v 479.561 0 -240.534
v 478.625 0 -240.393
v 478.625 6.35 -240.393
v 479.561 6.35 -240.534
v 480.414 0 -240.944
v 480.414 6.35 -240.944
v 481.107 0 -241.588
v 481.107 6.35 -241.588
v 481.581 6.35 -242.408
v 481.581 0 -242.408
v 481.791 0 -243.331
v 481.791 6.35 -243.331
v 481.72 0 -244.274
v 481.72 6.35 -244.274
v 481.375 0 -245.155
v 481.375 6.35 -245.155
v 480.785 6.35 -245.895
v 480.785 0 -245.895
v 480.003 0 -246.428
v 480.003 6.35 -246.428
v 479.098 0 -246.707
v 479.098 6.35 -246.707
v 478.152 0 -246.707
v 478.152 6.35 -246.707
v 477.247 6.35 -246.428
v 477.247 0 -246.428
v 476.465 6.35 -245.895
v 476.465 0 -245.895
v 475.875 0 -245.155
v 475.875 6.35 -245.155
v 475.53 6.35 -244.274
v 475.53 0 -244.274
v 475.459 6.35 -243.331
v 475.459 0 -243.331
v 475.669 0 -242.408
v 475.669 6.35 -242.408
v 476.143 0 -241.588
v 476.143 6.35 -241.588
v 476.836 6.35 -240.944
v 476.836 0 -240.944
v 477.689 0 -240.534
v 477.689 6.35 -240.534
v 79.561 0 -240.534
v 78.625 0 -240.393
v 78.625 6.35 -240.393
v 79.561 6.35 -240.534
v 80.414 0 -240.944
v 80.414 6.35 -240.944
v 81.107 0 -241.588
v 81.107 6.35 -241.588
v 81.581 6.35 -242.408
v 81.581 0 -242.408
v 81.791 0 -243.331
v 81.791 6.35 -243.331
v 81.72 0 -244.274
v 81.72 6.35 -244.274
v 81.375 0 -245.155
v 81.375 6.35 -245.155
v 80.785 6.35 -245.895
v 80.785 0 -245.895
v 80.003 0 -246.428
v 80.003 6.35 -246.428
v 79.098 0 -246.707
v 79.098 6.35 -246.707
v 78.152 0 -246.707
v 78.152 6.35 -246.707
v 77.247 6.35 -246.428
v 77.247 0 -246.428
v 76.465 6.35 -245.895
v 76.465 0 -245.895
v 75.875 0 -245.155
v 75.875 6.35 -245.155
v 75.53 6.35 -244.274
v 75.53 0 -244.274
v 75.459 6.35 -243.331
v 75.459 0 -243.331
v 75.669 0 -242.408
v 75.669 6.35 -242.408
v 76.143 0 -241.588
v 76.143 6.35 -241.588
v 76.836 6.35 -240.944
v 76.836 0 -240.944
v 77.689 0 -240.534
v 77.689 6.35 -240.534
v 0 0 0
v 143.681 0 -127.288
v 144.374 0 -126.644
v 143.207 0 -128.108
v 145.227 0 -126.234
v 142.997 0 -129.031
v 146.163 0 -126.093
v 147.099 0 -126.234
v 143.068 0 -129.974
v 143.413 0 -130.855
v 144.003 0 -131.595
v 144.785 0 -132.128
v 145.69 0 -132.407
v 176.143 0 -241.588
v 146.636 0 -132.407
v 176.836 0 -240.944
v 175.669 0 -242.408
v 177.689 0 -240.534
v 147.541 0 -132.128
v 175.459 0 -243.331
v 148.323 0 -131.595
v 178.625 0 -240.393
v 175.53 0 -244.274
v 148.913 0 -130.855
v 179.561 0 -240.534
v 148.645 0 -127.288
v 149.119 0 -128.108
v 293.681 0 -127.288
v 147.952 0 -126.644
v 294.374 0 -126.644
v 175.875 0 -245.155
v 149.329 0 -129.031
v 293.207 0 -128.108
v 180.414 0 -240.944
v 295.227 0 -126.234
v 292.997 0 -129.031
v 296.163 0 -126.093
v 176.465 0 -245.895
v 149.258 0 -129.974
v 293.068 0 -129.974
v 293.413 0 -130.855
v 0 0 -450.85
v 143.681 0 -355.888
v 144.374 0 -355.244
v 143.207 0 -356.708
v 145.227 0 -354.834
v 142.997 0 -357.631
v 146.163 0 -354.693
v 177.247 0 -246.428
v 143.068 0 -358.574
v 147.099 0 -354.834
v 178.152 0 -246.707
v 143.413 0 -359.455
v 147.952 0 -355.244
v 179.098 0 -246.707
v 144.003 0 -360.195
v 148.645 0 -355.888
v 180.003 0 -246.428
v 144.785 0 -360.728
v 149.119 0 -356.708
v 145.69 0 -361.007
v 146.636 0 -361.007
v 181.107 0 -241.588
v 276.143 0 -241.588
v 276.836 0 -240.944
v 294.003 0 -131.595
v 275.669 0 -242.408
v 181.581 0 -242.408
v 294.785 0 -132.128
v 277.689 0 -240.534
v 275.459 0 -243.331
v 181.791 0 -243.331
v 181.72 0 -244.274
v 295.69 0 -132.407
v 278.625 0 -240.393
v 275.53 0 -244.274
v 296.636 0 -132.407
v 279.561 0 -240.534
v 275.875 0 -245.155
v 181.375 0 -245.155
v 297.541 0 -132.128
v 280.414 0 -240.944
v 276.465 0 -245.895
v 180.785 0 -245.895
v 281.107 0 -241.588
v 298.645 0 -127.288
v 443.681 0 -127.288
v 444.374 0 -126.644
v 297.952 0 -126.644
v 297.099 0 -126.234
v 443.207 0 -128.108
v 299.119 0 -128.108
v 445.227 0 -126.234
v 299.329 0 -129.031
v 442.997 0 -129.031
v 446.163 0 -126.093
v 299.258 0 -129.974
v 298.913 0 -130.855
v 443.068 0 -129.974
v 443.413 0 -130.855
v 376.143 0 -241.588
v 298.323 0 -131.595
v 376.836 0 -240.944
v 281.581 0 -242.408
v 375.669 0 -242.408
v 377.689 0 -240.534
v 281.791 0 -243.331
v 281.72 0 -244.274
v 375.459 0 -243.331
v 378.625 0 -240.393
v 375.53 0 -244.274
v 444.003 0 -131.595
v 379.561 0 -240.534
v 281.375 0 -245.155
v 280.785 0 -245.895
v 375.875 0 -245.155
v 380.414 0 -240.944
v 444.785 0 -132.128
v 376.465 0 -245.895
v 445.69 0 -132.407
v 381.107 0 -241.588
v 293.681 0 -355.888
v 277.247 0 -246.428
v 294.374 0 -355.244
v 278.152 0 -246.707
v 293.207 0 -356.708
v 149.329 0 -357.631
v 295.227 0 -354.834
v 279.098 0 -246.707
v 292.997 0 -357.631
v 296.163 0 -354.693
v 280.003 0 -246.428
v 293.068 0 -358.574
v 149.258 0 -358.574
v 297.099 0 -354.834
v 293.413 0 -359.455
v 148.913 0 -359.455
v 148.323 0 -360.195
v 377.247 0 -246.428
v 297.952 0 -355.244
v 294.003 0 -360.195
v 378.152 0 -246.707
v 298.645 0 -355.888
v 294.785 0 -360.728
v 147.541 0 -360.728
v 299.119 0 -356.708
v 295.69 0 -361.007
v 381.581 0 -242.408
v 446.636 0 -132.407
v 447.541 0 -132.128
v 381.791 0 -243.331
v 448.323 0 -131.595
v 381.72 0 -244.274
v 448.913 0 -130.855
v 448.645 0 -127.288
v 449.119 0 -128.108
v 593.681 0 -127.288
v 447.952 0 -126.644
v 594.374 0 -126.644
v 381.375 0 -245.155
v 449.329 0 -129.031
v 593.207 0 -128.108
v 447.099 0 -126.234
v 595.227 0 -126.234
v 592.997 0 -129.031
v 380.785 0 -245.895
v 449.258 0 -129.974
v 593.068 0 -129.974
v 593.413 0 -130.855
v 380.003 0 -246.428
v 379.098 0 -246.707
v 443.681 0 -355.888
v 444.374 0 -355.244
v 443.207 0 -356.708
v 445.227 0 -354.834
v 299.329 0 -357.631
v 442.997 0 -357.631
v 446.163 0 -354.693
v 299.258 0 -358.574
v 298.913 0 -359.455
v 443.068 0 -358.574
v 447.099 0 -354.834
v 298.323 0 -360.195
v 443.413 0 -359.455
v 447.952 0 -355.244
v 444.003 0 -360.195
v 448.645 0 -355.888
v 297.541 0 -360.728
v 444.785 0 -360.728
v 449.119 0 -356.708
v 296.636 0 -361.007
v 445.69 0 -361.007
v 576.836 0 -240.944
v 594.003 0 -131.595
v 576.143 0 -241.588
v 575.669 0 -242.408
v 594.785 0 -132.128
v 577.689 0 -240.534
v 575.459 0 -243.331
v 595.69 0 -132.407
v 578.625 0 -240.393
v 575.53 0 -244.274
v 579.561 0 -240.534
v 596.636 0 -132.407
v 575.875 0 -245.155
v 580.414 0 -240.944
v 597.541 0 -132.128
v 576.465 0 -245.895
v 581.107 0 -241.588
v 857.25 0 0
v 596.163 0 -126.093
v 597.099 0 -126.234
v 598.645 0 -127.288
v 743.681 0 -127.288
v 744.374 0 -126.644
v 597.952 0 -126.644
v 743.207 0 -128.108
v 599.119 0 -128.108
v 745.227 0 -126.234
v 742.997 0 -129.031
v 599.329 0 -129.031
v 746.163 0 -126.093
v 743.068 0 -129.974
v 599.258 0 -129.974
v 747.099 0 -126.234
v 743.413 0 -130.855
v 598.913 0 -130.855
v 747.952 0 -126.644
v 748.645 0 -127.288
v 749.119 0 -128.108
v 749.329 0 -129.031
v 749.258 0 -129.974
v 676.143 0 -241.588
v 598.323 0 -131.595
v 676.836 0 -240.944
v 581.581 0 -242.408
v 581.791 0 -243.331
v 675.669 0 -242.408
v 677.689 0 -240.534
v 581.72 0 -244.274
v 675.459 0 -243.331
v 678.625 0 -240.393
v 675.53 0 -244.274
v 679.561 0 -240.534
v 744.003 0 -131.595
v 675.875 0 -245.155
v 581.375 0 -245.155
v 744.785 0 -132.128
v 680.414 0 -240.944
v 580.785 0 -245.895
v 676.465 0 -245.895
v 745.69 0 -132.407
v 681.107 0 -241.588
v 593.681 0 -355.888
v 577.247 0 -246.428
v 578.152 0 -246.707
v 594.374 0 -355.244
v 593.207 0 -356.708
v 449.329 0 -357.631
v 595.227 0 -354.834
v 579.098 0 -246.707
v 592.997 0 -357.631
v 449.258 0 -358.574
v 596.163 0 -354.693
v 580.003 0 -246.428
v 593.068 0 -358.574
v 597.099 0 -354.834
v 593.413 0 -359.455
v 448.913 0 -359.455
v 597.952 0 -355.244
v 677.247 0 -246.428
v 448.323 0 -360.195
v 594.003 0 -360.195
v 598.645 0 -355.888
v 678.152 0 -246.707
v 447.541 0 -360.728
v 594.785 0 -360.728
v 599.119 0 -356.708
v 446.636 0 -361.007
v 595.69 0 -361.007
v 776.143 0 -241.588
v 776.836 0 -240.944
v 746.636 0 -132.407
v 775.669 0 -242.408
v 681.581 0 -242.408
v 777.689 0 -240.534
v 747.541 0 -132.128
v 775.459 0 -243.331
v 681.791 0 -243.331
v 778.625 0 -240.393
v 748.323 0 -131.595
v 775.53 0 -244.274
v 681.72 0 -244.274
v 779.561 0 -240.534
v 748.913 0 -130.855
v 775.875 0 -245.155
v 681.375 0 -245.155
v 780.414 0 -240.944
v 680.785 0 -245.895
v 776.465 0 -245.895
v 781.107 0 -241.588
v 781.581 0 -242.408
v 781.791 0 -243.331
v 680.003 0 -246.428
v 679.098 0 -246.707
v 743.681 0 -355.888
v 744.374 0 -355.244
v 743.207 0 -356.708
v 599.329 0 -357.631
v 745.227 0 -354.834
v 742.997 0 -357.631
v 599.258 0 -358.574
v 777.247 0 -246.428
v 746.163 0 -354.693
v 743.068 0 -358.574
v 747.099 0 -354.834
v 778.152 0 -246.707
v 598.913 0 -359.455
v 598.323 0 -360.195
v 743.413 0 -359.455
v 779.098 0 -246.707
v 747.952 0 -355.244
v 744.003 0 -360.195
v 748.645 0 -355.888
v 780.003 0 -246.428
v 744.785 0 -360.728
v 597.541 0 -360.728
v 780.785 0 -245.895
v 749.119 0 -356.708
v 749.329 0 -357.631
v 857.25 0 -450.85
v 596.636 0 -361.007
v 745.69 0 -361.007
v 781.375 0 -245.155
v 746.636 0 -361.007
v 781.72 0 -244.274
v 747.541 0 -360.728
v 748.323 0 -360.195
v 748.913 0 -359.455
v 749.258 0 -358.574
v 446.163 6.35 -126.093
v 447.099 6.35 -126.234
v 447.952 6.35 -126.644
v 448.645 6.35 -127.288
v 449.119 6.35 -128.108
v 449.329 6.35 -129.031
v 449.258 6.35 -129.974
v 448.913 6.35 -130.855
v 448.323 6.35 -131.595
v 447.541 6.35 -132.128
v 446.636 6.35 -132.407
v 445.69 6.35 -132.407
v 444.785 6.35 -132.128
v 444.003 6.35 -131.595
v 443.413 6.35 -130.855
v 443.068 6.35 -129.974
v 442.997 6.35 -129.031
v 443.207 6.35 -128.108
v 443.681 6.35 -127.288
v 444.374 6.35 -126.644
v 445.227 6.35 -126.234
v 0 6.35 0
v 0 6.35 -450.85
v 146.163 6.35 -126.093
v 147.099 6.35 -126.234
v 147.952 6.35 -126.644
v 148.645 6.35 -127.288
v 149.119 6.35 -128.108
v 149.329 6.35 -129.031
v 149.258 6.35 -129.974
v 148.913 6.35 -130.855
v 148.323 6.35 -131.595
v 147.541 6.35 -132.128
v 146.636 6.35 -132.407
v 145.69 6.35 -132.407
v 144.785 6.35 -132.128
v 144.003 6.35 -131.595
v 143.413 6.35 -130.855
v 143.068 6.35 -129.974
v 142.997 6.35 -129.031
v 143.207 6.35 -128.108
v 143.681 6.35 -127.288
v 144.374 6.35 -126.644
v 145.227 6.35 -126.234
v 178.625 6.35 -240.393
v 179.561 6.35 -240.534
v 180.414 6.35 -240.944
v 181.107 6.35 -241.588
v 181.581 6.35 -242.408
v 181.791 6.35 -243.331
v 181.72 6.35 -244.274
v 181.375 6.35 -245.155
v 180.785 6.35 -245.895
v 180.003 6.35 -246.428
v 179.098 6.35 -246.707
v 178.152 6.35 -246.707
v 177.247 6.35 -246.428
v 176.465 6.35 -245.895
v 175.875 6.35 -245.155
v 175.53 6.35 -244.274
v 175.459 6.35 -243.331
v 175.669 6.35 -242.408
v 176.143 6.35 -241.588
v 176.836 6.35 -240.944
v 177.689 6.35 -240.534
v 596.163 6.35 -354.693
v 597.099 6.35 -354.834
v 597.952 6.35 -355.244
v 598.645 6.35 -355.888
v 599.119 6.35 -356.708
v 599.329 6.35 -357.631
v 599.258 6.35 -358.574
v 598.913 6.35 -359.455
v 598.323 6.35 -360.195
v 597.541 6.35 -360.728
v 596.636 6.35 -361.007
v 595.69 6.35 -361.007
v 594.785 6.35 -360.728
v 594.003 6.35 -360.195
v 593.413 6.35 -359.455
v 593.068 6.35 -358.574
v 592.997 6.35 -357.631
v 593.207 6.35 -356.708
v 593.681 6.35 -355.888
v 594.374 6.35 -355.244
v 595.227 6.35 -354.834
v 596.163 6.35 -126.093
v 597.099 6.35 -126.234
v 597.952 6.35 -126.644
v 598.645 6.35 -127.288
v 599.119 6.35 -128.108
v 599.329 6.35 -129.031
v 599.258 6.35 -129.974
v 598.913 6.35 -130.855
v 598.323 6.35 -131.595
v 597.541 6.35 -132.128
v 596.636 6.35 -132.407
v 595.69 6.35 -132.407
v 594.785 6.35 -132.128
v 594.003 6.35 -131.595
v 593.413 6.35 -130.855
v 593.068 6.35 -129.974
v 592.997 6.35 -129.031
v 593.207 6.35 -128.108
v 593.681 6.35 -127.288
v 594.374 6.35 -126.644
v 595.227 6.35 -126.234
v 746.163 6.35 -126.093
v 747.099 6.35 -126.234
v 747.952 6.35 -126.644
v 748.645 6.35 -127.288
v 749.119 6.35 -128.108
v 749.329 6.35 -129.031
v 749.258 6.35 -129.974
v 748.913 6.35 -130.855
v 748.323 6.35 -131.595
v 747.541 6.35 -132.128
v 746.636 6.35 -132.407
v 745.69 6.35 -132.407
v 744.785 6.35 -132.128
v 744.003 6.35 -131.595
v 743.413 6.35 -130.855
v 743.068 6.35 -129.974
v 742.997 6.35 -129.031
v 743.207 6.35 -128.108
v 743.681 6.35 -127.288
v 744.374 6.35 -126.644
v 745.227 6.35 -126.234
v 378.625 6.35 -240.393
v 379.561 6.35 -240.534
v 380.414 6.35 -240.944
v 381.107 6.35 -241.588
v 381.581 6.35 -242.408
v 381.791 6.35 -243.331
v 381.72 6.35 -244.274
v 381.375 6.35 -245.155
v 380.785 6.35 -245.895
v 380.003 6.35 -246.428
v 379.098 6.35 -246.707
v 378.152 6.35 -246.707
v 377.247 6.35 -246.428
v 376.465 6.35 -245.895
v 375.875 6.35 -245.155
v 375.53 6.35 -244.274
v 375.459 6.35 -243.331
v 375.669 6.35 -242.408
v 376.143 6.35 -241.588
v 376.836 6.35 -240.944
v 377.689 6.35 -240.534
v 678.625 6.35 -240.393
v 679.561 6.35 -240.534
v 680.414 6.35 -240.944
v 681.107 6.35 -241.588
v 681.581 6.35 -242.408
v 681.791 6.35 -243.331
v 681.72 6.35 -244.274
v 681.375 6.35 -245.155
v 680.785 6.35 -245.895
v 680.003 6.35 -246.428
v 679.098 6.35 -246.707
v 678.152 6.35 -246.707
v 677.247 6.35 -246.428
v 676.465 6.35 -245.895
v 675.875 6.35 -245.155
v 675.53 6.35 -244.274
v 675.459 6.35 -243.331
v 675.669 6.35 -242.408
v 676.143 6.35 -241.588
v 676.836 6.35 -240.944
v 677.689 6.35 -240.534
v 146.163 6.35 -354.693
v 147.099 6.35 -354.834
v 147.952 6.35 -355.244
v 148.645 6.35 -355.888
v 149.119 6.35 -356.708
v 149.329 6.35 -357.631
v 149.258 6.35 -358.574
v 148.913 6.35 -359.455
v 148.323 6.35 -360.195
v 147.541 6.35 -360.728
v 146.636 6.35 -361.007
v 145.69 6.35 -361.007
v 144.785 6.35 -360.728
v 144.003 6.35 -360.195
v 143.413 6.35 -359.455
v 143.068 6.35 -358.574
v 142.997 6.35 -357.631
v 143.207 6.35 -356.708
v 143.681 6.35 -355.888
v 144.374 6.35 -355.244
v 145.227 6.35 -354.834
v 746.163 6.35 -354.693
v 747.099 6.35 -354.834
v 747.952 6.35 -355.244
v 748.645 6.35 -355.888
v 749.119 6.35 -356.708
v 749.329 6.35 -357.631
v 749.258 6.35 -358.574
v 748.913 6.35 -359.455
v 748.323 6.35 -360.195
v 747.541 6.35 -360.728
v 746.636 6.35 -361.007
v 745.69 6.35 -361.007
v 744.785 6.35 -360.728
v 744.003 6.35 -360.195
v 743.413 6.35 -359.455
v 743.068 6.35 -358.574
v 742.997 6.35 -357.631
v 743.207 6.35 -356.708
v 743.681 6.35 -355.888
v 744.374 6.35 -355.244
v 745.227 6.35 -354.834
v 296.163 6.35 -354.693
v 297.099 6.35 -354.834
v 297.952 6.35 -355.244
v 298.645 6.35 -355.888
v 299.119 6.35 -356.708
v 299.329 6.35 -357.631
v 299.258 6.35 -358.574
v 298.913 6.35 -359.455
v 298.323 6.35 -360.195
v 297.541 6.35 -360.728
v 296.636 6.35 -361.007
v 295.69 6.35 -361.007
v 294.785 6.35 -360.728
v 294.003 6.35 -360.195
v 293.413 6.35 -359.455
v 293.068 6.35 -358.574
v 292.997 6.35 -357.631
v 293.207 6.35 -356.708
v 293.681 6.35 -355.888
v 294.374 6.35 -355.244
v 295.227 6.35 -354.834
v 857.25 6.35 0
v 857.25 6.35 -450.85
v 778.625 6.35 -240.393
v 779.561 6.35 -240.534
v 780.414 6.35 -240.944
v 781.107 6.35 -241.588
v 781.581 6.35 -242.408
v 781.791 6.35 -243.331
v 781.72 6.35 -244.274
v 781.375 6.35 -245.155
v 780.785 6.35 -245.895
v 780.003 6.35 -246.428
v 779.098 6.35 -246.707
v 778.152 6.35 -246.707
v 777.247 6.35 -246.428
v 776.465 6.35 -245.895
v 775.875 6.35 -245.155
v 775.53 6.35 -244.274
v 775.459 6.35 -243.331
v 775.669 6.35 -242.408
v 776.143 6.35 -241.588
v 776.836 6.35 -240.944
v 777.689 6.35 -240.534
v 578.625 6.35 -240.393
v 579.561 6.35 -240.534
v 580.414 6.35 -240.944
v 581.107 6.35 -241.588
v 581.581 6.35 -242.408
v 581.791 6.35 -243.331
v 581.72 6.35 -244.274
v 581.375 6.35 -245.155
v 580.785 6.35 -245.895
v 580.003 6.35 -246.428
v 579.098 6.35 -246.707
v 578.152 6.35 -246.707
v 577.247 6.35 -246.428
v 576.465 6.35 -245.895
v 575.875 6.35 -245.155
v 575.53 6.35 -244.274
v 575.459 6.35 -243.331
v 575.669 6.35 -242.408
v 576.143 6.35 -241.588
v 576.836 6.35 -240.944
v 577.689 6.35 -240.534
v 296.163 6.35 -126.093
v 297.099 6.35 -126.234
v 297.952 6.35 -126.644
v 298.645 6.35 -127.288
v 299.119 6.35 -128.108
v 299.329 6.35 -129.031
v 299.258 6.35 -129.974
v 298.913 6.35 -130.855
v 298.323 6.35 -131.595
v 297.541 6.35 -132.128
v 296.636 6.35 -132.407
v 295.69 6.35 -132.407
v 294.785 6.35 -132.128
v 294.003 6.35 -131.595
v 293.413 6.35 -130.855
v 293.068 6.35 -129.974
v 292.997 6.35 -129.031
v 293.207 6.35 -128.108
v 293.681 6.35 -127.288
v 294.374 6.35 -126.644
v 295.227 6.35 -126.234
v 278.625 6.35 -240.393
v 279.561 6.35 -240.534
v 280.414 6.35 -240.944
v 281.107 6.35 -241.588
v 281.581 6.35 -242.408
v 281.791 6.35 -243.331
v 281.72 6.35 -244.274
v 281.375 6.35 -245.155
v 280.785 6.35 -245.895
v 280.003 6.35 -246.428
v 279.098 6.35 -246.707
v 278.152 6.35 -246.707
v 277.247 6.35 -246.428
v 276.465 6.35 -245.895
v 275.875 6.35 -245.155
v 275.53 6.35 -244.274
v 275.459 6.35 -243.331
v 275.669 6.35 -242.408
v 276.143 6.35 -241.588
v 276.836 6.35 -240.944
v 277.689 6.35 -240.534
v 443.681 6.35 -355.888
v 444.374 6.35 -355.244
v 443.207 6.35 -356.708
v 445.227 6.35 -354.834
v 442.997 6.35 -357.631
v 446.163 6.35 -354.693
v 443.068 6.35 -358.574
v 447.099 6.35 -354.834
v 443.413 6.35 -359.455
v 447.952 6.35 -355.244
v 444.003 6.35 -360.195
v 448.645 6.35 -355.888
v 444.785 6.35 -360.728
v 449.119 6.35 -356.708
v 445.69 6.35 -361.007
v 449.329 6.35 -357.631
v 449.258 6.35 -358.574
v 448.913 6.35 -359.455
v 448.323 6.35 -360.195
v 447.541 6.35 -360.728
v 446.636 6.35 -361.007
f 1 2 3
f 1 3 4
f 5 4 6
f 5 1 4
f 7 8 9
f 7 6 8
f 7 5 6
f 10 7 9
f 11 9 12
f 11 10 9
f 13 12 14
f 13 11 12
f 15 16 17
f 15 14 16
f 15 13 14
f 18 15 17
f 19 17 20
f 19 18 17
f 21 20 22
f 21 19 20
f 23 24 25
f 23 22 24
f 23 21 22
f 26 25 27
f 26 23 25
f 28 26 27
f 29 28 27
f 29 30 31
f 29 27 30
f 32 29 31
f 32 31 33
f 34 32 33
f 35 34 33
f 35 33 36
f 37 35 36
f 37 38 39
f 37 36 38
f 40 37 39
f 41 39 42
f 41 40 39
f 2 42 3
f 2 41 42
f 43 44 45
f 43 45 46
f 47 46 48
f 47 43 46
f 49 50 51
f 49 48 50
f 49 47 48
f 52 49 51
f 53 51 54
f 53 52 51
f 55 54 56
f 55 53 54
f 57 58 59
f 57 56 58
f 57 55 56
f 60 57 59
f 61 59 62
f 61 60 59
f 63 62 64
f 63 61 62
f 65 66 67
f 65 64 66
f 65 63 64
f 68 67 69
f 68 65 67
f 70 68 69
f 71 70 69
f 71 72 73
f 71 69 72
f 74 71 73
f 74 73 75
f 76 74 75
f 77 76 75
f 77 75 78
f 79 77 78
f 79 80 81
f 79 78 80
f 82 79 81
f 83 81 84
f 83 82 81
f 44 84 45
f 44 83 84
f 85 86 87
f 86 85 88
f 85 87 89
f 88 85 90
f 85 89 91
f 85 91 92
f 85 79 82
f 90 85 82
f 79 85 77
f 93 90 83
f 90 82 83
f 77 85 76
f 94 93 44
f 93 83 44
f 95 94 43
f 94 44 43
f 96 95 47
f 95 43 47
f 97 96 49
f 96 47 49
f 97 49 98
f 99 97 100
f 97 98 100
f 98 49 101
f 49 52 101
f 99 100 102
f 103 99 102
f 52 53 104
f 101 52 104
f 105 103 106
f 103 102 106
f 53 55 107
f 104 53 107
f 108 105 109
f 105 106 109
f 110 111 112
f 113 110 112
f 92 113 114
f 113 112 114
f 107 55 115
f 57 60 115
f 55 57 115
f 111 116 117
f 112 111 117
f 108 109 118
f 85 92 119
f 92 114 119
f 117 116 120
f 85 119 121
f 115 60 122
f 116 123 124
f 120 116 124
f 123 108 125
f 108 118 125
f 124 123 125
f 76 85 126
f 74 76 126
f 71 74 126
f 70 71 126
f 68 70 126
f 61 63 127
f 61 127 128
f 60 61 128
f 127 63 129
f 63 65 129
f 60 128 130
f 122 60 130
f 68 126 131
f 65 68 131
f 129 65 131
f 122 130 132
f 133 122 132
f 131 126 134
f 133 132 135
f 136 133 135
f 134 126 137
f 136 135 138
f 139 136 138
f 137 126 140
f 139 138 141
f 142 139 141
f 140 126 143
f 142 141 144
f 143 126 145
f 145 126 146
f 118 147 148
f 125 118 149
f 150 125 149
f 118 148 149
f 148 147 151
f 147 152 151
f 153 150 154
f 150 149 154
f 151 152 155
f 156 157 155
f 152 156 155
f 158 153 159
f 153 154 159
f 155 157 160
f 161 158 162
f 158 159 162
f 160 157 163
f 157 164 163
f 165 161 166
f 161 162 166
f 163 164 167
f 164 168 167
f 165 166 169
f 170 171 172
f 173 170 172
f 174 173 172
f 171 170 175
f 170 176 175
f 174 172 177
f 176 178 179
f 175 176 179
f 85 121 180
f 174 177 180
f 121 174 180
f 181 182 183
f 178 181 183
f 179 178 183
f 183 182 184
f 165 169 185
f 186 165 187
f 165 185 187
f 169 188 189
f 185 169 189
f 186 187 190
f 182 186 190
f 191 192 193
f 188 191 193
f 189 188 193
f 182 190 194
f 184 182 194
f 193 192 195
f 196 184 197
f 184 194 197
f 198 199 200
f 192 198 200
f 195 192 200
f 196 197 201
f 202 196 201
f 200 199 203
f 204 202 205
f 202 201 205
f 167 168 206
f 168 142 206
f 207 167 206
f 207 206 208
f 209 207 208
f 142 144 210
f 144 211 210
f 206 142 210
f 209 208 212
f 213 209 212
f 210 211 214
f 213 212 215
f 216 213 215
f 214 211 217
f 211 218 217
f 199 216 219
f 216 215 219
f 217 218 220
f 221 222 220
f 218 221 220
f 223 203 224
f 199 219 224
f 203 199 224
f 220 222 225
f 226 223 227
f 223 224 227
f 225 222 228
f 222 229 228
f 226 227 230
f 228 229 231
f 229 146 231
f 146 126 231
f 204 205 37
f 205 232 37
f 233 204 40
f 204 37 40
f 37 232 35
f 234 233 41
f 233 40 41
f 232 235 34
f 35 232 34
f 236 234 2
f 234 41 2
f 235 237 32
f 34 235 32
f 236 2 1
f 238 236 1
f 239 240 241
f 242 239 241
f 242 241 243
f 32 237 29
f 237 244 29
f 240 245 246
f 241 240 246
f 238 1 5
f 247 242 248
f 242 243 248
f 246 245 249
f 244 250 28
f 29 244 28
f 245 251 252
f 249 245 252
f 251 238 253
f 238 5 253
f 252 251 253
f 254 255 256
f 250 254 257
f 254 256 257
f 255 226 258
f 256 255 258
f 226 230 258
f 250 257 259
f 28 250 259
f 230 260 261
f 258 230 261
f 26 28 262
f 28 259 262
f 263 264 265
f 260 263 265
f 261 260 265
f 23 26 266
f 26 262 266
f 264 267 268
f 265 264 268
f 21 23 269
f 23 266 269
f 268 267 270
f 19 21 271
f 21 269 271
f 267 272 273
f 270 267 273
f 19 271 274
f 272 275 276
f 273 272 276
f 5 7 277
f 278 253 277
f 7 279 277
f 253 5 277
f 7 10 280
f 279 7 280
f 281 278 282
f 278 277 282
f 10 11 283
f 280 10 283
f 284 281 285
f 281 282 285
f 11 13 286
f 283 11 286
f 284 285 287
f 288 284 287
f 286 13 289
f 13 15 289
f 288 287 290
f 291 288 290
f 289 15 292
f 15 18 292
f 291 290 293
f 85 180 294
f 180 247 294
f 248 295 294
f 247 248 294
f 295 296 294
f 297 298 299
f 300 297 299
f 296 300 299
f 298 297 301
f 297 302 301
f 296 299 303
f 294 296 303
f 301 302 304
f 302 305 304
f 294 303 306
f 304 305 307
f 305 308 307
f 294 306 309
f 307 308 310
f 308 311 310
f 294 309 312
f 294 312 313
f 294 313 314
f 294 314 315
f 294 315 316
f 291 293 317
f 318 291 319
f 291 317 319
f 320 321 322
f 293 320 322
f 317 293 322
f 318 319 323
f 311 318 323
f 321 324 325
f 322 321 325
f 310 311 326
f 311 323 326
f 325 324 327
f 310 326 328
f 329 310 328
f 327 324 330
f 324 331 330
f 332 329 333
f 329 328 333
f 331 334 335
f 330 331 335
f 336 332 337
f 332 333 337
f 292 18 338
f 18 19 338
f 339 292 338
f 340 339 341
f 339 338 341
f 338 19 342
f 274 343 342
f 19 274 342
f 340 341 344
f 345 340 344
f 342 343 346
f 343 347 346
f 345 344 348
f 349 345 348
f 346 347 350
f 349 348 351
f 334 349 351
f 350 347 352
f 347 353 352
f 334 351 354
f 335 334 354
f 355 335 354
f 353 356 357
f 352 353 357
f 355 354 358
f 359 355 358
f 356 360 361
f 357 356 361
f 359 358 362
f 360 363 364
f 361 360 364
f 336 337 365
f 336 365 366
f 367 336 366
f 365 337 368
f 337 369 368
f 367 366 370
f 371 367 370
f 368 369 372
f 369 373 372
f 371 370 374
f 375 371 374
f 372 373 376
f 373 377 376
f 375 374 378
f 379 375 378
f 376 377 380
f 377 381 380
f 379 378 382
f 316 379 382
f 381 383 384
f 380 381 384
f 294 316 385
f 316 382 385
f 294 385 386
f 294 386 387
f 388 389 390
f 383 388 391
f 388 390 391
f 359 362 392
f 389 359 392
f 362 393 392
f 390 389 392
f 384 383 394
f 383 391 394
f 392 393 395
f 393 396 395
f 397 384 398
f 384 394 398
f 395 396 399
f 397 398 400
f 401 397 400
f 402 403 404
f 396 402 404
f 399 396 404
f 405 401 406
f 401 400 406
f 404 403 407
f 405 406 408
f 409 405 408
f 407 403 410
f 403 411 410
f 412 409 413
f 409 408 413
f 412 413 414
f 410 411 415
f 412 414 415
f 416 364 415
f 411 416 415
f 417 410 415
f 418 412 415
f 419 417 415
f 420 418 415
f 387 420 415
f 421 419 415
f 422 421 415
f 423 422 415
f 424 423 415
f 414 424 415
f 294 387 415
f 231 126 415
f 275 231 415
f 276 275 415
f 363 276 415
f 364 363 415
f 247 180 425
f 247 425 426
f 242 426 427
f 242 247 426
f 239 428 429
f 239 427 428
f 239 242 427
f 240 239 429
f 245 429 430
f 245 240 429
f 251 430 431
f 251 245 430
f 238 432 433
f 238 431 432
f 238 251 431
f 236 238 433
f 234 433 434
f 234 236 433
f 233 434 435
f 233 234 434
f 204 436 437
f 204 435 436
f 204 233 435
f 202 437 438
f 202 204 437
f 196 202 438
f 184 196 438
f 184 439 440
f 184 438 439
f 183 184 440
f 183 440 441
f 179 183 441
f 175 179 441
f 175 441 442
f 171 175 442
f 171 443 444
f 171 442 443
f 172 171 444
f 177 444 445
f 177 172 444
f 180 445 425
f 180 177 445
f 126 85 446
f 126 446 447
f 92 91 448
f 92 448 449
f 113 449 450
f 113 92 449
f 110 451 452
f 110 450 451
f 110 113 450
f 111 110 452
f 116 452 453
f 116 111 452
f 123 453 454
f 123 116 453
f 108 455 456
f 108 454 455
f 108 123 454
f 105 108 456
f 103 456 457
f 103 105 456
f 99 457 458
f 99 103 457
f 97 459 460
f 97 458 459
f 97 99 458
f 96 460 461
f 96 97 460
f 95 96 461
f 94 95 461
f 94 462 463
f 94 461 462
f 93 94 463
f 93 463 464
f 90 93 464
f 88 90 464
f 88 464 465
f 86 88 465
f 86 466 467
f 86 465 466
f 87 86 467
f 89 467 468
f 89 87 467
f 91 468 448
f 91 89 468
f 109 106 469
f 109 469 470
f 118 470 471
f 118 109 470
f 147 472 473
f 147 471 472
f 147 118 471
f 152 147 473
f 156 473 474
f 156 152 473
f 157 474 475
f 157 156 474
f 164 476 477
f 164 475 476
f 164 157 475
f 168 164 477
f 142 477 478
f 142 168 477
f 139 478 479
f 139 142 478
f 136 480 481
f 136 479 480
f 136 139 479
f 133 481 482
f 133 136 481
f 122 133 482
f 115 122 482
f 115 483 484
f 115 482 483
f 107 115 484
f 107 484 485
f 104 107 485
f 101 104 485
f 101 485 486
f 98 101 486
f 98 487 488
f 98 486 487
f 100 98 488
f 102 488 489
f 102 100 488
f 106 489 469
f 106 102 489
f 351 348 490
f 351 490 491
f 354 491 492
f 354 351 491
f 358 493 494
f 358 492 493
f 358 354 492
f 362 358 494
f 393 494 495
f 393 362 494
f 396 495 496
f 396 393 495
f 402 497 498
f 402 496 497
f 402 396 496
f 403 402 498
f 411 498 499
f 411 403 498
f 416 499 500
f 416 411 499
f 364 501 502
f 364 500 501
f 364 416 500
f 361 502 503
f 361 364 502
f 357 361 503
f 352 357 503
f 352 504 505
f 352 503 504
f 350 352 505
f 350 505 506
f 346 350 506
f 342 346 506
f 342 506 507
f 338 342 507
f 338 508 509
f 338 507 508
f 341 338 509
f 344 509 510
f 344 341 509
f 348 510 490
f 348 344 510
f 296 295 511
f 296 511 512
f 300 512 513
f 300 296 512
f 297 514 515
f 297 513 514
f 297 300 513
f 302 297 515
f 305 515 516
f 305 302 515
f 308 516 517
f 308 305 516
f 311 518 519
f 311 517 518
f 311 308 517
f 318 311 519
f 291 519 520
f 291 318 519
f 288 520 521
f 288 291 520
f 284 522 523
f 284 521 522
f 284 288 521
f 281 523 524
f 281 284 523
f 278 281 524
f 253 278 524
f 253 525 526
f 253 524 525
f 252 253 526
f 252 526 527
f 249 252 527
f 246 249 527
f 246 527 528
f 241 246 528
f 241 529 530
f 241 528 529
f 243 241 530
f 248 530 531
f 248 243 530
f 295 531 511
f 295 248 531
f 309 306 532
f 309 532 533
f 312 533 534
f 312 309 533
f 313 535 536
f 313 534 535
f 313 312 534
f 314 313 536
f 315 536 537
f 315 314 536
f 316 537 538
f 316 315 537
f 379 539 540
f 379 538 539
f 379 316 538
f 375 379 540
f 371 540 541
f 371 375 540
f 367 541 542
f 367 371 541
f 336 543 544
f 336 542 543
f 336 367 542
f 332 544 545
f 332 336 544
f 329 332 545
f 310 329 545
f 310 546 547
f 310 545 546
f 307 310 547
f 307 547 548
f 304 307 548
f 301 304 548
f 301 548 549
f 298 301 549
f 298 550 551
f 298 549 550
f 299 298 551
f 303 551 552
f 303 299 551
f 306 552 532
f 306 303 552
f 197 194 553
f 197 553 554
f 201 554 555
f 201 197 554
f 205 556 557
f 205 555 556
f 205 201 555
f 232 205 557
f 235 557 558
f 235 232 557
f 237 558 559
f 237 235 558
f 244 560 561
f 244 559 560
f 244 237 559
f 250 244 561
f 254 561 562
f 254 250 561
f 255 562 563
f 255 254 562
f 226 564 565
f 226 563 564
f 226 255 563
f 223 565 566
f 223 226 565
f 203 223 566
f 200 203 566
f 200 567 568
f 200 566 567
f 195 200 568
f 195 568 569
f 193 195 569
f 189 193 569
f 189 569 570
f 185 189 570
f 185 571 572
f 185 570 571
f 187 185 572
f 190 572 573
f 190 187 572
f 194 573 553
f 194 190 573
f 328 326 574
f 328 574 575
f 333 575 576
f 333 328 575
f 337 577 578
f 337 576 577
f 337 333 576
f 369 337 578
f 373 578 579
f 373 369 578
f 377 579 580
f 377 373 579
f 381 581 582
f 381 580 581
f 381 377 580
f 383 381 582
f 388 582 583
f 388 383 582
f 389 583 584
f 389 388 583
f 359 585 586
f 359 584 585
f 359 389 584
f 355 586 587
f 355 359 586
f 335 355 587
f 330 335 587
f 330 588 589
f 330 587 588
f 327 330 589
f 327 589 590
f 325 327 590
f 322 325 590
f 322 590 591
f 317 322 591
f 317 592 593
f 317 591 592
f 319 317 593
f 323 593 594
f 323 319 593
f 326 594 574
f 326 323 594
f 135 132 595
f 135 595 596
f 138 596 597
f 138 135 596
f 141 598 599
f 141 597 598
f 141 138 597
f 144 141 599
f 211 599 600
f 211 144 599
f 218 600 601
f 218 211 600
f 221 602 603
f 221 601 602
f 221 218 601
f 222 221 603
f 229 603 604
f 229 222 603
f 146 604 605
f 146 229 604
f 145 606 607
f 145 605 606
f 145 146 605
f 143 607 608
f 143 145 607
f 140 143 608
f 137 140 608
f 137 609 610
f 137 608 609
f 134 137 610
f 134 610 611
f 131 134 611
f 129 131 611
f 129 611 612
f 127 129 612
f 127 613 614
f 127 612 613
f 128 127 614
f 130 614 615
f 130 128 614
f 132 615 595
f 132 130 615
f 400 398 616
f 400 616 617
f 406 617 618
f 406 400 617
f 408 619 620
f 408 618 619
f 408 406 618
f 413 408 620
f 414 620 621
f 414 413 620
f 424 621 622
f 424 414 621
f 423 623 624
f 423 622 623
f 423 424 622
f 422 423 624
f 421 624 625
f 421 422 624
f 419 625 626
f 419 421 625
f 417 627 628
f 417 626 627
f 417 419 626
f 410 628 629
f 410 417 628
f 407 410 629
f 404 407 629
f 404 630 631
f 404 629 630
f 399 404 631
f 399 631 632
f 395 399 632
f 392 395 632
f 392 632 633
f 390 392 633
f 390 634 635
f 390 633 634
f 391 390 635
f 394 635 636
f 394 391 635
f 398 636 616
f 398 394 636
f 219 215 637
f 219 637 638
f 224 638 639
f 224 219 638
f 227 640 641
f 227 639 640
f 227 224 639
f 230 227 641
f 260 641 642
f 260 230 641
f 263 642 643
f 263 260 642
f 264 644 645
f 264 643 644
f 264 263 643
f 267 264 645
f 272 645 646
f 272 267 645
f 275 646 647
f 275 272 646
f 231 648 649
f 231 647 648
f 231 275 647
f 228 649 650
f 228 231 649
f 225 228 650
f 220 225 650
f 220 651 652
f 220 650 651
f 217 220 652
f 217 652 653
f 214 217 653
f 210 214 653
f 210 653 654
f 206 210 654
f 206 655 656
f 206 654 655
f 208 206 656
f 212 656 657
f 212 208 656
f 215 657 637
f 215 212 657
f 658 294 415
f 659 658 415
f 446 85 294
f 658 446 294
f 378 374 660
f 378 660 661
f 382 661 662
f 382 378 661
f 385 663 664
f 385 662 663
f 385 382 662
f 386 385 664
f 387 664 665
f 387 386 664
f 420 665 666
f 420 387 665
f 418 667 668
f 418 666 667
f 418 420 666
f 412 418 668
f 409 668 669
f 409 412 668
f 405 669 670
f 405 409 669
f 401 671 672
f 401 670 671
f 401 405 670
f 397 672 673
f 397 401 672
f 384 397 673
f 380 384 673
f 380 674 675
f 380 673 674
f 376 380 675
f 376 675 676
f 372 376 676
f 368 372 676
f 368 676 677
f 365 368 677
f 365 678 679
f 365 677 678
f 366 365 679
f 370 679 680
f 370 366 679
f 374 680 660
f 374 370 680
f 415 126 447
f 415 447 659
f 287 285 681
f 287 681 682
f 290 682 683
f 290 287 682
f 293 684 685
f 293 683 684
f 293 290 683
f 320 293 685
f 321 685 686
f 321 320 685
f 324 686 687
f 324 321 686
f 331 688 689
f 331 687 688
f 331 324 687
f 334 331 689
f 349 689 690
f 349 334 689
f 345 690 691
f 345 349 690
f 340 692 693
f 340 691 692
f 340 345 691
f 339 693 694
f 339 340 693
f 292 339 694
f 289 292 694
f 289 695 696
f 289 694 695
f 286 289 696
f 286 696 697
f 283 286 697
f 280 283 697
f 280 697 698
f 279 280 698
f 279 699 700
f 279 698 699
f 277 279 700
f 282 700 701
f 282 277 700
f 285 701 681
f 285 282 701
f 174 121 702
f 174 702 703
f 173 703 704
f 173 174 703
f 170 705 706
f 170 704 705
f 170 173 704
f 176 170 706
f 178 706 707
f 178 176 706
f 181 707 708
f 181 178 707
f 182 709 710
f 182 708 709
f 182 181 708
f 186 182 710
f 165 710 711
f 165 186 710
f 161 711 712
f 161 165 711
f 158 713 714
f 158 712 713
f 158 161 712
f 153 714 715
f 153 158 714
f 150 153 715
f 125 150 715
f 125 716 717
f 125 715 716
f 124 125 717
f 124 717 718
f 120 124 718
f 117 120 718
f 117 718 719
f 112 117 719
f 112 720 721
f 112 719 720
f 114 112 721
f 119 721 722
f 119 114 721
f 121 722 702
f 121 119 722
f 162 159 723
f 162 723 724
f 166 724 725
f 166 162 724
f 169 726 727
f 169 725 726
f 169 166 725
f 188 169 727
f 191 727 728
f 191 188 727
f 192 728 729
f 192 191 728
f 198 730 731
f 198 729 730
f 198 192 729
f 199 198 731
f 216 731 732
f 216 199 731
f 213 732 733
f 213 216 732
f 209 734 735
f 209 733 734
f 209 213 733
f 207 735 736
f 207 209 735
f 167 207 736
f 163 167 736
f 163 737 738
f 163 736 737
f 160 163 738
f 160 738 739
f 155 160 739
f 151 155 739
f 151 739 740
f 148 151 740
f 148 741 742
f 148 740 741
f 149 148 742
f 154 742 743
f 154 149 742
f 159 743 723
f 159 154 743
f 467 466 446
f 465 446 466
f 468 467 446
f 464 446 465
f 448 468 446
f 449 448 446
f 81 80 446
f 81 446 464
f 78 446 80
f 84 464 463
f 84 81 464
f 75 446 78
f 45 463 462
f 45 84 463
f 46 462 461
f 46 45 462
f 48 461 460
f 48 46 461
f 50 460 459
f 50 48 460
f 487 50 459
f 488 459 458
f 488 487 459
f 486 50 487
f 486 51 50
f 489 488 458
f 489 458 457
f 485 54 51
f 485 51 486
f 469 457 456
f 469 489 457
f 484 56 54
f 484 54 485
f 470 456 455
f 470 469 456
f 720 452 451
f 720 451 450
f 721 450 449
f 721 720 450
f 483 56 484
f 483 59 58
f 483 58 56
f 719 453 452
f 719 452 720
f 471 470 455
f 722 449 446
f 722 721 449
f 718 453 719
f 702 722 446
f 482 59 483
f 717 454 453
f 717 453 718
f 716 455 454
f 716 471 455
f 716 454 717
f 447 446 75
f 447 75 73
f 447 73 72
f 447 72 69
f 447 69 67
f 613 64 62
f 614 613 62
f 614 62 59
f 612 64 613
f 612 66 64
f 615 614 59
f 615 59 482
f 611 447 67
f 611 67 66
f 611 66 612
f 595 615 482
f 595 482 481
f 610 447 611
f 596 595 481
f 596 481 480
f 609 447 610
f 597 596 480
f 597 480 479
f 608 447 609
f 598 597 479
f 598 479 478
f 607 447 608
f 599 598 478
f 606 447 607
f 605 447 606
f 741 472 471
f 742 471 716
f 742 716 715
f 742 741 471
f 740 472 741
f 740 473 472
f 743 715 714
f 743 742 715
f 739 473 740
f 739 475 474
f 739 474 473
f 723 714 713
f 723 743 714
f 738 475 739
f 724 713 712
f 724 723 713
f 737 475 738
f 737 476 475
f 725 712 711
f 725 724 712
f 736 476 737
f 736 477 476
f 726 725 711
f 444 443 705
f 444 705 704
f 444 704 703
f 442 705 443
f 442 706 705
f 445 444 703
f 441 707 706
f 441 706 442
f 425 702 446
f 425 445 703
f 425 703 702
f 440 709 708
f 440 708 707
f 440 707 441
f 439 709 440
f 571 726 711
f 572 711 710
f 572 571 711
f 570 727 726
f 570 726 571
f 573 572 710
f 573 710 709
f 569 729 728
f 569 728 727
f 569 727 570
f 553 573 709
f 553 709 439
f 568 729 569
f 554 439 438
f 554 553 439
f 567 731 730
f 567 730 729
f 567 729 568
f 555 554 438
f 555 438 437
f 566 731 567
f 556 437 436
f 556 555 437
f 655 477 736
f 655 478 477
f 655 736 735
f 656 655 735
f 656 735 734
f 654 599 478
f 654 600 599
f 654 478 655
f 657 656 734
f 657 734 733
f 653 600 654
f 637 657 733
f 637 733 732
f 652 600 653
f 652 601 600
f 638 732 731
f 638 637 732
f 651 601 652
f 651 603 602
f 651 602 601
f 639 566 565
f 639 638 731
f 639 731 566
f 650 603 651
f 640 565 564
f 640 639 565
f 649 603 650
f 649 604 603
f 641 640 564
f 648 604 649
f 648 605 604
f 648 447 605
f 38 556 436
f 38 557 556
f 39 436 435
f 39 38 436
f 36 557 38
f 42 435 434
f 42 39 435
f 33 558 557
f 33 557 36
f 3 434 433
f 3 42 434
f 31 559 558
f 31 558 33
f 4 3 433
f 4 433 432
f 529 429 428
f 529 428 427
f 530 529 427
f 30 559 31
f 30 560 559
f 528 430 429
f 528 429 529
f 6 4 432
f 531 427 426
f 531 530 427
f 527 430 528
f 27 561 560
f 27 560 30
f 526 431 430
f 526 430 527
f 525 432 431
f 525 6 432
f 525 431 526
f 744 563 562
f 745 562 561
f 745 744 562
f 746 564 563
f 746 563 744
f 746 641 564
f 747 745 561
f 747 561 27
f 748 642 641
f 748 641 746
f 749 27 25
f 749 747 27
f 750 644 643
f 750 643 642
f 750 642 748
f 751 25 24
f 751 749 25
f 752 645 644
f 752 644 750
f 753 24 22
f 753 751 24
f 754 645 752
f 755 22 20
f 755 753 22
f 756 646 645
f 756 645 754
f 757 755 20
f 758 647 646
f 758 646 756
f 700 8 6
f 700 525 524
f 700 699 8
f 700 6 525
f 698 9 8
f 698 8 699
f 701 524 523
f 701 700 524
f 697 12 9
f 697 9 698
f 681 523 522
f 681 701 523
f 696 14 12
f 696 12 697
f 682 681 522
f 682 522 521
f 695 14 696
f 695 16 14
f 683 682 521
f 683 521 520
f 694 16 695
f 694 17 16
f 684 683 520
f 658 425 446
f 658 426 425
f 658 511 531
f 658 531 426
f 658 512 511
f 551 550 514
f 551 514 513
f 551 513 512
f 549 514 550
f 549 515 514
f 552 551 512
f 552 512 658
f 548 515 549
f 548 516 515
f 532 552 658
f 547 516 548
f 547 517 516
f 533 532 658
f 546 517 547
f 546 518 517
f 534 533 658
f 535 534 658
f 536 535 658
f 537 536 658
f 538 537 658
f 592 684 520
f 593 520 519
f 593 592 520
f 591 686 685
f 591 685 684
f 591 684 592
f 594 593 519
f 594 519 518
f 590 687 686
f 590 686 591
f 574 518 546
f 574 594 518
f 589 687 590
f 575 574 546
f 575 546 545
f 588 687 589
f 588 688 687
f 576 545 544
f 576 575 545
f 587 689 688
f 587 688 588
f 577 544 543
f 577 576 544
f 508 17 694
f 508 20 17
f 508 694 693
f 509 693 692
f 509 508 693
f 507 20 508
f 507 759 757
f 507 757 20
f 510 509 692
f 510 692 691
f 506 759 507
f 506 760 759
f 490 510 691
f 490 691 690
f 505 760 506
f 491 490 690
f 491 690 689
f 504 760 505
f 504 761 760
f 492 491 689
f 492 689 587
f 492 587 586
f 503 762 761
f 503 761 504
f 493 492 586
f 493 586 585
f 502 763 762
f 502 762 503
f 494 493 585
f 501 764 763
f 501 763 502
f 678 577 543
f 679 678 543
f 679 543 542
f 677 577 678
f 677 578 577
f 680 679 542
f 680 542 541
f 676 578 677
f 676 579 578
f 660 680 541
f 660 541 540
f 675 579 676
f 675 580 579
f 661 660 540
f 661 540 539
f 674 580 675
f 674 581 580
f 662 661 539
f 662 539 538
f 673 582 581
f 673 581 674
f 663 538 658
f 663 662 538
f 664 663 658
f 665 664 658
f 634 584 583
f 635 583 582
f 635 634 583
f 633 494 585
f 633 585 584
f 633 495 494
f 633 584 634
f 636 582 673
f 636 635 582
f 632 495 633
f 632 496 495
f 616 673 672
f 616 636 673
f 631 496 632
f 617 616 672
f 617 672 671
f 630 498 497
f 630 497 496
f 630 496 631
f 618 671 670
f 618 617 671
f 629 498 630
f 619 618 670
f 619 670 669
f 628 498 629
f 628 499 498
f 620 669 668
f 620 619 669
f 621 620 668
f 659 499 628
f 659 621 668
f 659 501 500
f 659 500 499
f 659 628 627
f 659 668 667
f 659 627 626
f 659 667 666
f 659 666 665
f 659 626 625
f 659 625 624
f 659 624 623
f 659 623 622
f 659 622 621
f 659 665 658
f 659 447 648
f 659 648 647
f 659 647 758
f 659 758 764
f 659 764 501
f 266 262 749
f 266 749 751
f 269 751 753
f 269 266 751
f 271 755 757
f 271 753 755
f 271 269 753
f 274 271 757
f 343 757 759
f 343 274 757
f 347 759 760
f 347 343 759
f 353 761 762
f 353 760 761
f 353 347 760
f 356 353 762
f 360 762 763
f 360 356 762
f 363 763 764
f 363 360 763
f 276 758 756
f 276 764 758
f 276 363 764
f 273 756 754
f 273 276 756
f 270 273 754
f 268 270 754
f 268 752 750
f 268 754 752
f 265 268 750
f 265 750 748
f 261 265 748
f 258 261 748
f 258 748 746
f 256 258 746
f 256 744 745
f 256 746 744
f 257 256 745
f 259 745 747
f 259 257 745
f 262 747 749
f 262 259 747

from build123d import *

# Parameters (mm, degrees)
SKETCH1_W               = 857.25
SKETCH1_H               = 450.85
BOSS_EXTRUDE1_DEPTH     = 6.35
CUT_EXTRUDE1_DEPTH      = 969.598785618
CUT_EXTRUDE1_DEPTH_BACK = 969.598785618
SKETCH2_R               = 3.175


with BuildPart() as part:
    # Sketch1 → Boss-Extrude1 (new body)
    with BuildSketch(Plane(origin=(0, 0, 0), x_dir=(1, 0, 0), z_dir=(0, 1, 0))):
        with Locations((428.625, 225.425)):
            Rectangle(SKETCH1_W, SKETCH1_H)
    extrude(amount=BOSS_EXTRUDE1_DEPTH)

    # Sketch2 → Cut-Extrude1 (cut, two sides: drawn at the far end of the back side and taken through both)
    with BuildSketch(Plane(origin=(0, 6.35, 0), x_dir=(1, 0, 0), z_dir=(0, 1, 0)).offset(-CUT_EXTRUDE1_DEPTH_BACK)):
        with Locations(Location((78.625, 243.56780677, 0), (0, 0, 270))):
            Circle(SKETCH2_R)
        with Locations(Location((178.625, 243.56780677, 0), (0, 0, 270))):
            Circle(SKETCH2_R)
        with Locations(Location((278.625, 243.56780677, 0), (0, 0, 270))):
            Circle(SKETCH2_R)
        with Locations(Location((378.625, 243.56780677, 0), (0, 0, 270))):
            Circle(SKETCH2_R)
        with Locations(Location((478.625, 243.56780677, 0), (0, 0, 270))):
            Circle(SKETCH2_R)
        with Locations(Location((578.625, 243.56780677, 0), (0, 0, 270))):
            Circle(SKETCH2_R)
        with Locations(Location((678.625, 243.56780677, 0), (0, 0, 270))):
            Circle(SKETCH2_R)
        with Locations(Location((778.625, 243.56780677, 0), (0, 0, 270))):
            Circle(SKETCH2_R)
        with Locations(Location((146.163, 357.86780677, 0), (0, 0, 270))):
            Circle(SKETCH2_R)
        with Locations(Location((296.163, 357.86780677, 0), (0, 0, 270))):
            Circle(SKETCH2_R)
        with Locations(Location((446.163, 357.86780677, 0), (0, 0, 270))):
            Circle(SKETCH2_R)
        with Locations(Location((596.163, 357.86780677, 0), (0, 0, 270))):
            Circle(SKETCH2_R)
        with Locations(Location((746.163, 357.86780677, 0), (0, 0, 270))):
            Circle(SKETCH2_R)
        with Locations(Location((146.163, 129.26780677, 0), (0, 0, 270))):
            Circle(SKETCH2_R)
        with Locations(Location((296.163, 129.26780677, 0), (0, 0, 270))):
            Circle(SKETCH2_R)
        with Locations(Location((446.163, 129.26780677, 0), (0, 0, 270))):
            Circle(SKETCH2_R)
        with Locations(Location((596.163, 129.26780677, 0), (0, 0, 270))):
            Circle(SKETCH2_R)
        with Locations(Location((746.163, 129.26780677, 0), (0, 0, 270))):
            Circle(SKETCH2_R)
    extrude(amount=CUT_EXTRUDE1_DEPTH + CUT_EXTRUDE1_DEPTH_BACK, mode=Mode.SUBTRACT)


solid = part.part
